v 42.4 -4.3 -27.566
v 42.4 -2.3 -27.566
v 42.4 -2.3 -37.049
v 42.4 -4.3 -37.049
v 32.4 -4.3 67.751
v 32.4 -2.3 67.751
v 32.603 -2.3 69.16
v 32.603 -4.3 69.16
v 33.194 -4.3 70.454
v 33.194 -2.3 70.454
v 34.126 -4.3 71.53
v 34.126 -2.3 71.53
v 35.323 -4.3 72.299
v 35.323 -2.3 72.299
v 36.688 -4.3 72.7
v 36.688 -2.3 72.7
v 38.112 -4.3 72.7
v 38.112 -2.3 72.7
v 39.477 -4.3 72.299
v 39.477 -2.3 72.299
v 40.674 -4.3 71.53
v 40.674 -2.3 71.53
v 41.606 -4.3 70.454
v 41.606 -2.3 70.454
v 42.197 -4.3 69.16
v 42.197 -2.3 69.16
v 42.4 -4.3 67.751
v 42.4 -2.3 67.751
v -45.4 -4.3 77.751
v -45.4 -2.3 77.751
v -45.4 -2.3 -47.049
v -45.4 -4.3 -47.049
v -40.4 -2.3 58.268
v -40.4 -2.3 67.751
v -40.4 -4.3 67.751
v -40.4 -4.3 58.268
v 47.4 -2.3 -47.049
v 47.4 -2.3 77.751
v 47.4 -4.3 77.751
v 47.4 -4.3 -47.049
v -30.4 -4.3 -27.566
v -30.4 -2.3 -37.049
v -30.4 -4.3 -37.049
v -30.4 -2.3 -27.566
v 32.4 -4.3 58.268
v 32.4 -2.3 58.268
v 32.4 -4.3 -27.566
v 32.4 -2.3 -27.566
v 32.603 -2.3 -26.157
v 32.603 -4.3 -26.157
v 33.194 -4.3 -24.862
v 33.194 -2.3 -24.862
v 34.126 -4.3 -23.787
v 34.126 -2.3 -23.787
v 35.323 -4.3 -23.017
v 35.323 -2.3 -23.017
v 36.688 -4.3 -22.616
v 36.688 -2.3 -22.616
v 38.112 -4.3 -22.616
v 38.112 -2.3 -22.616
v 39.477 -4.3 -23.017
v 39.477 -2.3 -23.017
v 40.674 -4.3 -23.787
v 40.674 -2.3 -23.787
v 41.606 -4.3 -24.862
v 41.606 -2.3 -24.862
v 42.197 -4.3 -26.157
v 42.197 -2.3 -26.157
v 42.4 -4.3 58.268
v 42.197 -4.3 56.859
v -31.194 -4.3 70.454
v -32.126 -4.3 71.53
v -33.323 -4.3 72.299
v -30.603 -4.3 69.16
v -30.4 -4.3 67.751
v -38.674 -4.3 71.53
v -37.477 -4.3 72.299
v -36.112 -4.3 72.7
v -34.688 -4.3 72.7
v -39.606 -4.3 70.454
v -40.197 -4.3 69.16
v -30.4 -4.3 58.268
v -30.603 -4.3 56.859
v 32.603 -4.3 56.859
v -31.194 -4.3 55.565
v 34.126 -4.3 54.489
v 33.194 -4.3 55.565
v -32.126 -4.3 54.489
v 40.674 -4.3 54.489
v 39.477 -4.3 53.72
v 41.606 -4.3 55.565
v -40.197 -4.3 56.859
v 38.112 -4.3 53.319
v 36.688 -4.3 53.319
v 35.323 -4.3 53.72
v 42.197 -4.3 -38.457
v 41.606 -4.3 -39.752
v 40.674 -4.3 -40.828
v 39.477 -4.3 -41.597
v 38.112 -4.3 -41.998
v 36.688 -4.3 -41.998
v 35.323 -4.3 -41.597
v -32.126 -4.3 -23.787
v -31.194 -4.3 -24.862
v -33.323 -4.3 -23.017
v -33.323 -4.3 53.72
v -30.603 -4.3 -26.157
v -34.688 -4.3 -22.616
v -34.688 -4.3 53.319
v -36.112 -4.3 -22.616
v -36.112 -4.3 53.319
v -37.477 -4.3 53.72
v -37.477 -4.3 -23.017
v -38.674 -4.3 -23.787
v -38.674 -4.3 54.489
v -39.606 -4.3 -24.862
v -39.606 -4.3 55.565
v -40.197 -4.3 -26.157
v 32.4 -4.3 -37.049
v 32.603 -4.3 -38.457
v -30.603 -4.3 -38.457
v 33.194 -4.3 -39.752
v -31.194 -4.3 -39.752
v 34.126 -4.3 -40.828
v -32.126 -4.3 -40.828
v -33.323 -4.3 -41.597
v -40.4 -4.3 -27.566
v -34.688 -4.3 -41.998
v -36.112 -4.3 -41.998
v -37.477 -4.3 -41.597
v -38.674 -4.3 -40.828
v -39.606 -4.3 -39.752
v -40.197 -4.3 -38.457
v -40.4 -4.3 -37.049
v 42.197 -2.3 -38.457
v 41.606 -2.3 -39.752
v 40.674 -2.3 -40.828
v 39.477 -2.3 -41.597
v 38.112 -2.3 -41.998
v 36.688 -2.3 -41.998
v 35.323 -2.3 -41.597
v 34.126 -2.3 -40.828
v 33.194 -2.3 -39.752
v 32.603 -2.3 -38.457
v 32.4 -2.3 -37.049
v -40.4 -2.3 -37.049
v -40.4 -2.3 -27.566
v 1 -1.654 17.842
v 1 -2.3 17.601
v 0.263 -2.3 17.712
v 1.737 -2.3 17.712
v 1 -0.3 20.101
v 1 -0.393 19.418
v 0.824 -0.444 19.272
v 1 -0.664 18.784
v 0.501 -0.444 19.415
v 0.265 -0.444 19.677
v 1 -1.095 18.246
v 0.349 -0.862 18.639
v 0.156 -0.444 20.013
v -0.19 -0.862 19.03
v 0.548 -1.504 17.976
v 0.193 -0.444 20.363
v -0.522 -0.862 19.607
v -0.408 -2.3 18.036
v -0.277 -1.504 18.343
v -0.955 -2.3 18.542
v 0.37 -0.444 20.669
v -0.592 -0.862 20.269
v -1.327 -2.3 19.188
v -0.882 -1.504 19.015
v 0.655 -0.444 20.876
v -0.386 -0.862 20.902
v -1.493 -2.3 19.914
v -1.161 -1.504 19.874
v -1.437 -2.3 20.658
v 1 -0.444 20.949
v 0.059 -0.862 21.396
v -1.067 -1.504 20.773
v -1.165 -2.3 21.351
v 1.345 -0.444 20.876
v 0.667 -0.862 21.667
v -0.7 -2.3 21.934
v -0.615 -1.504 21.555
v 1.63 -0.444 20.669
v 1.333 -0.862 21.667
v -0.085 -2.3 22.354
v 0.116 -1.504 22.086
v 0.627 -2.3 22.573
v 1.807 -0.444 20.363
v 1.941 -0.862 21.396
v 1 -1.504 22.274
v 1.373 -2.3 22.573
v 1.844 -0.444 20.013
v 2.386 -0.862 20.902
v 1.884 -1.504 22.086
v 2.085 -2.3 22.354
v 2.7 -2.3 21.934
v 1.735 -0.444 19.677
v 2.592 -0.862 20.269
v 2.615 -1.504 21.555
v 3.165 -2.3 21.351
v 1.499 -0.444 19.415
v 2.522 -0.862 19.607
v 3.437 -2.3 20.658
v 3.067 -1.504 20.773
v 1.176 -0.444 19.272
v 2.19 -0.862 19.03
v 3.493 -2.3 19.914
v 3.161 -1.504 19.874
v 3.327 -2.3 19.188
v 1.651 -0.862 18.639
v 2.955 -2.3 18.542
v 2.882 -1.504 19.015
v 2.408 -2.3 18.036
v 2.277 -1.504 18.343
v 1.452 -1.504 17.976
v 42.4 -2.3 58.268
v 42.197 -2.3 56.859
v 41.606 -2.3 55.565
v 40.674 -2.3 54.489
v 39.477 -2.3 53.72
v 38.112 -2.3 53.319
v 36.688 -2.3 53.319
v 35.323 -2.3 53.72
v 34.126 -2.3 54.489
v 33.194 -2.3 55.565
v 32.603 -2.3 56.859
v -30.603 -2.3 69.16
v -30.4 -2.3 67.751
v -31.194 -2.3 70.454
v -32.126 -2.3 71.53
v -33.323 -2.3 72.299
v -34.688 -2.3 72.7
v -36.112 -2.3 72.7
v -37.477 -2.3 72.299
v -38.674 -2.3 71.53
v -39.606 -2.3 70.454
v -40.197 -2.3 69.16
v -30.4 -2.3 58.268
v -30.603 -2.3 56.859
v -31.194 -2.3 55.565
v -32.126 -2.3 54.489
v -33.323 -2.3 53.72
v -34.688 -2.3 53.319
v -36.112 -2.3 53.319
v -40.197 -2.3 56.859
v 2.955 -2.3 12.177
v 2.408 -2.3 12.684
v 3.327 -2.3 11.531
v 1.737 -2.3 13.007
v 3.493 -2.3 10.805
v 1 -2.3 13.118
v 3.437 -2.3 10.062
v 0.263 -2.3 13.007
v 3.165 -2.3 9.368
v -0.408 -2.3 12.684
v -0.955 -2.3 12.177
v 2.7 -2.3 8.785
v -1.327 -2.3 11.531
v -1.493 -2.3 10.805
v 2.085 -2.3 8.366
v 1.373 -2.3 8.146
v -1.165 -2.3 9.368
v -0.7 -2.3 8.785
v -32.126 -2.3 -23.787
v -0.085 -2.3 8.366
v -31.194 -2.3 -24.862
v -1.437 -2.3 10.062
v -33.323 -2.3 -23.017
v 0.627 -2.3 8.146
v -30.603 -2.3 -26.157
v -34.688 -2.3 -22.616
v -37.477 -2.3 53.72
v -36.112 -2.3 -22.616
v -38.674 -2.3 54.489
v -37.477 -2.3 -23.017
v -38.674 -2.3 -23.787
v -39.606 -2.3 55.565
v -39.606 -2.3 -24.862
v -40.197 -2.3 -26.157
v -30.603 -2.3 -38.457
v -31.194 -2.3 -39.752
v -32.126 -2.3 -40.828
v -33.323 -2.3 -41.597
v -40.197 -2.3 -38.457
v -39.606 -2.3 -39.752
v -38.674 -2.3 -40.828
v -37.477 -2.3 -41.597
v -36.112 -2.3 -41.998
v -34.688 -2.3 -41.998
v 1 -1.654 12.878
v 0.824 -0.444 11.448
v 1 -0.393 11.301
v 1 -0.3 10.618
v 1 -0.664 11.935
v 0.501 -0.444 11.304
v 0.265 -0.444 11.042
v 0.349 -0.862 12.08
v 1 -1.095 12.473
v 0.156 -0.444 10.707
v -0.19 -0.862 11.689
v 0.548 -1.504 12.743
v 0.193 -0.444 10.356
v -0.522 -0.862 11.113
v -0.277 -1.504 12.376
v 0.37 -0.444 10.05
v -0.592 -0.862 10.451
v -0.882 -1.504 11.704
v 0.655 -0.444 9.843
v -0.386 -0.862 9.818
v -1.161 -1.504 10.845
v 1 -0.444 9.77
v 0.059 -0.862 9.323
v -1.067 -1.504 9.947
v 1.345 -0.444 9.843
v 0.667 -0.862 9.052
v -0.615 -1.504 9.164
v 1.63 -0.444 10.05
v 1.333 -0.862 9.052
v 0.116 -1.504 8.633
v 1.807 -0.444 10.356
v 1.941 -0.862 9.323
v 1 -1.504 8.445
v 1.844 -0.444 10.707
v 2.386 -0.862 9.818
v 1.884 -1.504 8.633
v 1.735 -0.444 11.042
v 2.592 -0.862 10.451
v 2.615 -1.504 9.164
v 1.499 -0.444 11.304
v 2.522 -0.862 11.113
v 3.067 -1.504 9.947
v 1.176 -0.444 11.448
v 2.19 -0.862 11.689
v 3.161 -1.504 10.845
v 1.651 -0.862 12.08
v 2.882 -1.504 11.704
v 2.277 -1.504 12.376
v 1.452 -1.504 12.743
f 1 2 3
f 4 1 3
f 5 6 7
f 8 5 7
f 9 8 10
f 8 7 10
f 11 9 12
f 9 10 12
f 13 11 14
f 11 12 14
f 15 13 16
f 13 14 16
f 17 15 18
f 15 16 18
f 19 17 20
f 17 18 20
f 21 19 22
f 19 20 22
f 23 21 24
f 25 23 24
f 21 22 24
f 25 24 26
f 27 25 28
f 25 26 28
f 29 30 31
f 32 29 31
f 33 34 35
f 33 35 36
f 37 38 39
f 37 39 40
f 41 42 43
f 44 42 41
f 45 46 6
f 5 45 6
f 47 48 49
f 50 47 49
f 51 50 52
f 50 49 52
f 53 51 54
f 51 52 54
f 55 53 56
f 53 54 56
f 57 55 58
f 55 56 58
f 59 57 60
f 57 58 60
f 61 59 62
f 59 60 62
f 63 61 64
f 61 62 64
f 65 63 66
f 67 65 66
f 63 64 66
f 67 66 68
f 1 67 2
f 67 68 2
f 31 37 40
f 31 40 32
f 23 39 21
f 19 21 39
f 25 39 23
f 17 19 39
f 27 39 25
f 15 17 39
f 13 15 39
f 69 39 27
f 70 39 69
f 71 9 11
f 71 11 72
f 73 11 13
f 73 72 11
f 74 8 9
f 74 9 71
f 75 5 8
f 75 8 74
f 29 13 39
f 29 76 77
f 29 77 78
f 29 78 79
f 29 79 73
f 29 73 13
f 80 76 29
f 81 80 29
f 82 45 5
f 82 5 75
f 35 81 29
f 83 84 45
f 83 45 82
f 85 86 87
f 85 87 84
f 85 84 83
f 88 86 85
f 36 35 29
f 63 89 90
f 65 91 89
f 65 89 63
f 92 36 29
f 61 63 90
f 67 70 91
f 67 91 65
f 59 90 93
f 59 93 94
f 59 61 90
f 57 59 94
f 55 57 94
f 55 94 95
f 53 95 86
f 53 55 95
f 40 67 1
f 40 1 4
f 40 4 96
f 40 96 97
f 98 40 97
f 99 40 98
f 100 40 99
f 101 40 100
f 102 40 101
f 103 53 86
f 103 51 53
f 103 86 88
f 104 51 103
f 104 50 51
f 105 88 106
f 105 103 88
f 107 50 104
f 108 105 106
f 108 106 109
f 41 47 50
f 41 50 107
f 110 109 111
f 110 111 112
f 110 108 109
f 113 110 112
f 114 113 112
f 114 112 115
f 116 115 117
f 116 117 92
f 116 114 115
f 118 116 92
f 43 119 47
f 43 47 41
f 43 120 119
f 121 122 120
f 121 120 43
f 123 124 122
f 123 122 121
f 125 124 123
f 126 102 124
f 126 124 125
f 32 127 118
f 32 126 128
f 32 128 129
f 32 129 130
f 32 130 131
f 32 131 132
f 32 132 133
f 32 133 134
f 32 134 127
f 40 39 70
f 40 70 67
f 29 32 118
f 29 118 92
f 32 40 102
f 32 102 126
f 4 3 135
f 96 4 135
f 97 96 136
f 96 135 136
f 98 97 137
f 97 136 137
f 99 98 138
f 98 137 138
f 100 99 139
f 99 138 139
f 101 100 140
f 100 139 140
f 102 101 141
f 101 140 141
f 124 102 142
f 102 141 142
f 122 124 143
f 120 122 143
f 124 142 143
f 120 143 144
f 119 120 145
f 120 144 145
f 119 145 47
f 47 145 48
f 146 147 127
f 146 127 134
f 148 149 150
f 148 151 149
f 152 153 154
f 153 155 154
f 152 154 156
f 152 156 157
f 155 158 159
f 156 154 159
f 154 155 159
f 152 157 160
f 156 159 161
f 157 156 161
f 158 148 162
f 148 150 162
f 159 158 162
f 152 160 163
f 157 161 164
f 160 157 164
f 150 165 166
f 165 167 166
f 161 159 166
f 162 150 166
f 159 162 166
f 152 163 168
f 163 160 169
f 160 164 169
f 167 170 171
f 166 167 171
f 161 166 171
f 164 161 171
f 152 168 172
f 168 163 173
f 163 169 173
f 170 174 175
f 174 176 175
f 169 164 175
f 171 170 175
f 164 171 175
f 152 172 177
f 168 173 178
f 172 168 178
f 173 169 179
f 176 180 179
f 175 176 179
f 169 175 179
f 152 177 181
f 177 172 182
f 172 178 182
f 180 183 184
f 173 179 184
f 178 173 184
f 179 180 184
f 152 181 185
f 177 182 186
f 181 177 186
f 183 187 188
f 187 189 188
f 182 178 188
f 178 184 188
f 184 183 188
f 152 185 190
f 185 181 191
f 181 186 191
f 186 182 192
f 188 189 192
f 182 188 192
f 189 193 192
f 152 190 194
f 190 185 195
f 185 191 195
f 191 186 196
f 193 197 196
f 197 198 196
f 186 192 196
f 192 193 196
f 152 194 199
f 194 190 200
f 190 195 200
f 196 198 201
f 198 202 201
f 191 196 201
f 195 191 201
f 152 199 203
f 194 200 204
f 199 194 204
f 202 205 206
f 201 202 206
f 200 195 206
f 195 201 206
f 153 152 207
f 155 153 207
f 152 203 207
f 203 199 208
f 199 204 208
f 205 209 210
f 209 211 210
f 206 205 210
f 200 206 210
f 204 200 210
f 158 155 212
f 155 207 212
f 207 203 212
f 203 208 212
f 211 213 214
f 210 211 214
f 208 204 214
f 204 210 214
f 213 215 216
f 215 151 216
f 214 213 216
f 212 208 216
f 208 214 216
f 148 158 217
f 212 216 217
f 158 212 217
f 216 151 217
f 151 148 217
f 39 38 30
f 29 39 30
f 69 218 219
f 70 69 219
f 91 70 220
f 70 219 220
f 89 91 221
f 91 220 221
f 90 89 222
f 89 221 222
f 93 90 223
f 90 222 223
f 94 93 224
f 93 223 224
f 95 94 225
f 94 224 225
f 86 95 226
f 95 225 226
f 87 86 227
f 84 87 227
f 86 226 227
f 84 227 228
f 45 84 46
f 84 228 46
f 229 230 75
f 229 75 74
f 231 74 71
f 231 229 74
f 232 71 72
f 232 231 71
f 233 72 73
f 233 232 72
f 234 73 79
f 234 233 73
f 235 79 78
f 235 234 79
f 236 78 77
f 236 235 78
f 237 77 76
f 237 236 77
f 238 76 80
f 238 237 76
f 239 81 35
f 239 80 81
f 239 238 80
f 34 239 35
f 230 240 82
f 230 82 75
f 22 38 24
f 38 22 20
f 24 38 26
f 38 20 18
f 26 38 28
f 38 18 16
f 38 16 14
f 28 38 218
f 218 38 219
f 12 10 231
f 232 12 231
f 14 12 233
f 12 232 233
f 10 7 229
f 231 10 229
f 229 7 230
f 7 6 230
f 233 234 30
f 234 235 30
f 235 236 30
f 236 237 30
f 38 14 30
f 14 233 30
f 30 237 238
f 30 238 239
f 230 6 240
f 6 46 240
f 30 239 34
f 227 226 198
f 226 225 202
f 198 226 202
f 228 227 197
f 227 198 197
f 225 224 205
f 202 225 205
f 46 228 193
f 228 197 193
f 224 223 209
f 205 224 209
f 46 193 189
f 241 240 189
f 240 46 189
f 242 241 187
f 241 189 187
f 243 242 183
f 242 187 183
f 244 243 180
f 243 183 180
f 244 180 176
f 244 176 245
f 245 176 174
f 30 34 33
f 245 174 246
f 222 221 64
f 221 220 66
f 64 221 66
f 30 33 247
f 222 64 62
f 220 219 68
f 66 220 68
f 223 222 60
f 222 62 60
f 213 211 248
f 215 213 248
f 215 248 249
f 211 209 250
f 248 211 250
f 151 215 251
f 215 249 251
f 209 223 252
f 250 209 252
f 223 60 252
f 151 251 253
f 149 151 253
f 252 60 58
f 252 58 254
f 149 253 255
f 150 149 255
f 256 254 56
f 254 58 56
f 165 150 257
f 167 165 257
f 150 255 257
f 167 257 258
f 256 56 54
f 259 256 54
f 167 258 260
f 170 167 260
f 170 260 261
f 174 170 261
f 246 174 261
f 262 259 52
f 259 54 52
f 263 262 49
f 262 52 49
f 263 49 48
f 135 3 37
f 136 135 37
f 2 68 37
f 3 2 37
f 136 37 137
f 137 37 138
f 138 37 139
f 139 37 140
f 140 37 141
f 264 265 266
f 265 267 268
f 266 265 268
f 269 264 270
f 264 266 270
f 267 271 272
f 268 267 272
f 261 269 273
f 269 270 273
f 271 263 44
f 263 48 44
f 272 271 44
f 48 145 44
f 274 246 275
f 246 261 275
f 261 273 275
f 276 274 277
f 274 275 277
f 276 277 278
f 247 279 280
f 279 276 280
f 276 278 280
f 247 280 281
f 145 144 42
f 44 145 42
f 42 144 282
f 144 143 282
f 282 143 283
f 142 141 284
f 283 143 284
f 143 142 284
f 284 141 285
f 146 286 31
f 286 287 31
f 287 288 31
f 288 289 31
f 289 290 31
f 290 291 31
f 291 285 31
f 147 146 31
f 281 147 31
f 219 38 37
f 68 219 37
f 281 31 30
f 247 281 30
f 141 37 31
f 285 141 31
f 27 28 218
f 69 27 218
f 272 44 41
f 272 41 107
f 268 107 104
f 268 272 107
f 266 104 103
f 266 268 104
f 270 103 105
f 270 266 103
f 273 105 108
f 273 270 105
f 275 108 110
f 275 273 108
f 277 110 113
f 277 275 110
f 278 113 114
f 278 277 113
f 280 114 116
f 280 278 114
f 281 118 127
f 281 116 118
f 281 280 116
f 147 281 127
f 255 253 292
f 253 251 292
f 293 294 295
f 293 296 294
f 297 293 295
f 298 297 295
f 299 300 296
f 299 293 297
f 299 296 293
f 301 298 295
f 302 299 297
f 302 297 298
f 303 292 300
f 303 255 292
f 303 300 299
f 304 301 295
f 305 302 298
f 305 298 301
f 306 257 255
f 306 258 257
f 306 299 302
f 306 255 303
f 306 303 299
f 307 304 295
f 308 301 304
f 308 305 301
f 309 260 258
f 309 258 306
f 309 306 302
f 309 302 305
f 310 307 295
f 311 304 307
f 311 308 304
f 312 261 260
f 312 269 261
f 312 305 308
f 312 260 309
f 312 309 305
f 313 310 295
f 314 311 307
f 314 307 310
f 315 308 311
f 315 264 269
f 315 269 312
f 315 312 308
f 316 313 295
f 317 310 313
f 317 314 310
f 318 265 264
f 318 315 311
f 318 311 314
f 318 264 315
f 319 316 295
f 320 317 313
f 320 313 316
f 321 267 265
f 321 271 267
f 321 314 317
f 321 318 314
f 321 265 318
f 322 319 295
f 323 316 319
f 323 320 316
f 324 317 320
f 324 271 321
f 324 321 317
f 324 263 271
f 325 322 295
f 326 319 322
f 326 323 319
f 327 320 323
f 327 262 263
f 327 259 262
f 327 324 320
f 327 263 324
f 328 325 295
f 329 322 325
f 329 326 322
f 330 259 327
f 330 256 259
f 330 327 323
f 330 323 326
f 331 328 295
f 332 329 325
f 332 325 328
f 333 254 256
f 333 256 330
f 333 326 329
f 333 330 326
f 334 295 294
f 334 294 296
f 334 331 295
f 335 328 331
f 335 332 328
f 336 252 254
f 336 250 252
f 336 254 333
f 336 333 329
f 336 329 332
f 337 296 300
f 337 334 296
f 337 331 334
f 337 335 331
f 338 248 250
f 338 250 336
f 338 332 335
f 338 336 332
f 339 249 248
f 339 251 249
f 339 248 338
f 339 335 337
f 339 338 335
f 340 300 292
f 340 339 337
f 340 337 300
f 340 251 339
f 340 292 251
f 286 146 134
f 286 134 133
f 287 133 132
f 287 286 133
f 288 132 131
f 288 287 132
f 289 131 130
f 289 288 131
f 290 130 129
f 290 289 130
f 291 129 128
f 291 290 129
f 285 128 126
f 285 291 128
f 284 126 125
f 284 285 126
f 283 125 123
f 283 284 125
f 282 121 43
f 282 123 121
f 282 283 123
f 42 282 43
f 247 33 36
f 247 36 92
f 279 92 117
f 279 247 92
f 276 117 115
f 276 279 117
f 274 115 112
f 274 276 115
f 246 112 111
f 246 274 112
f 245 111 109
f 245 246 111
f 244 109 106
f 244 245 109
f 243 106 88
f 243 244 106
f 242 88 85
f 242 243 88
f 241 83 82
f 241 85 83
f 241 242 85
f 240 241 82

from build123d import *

# Parameters (mm, degrees)
SKETCH1_W           = 92.8
SKETCH1_H           = 124.8
BOSS_EXTRUDE1_DEPTH = 2
CUT_EXTRUDE1_DEPTH  = 92.082431134


with BuildPart() as part:
    # Sketch1 → Boss-Extrude1 (new body)
    with BuildSketch(Plane(origin=(0, -2.3, 0), x_dir=(-1, 0, 0), z_dir=(0, -1, 0))):
        with Locations((-1, -15.351201027)):
            Rectangle(SKETCH1_W, SKETCH1_H)
    extrude(amount=BOSS_EXTRUDE1_DEPTH)

    # Sketch3 → Revolve2 (revolve)
    with BuildSketch(Plane.ZY.offset(-1), mode=Mode.PRIVATE) as revolve2_sk:
        with BuildLine():
            Line((8.11798754, -2.3), (10.61798754, -2.3))
            Line((10.61798754, -2.3), (10.61798754, -0.3))
            ThreePointArc((10.61798754, -0.3), (9.017206481, -0.861523676), (8.11798754, -2.3))
        make_face()
    revolve(revolve2_sk.sketch.rotate(Axis((1, -0.3, 10.61798754), (0, -1, 0)), 180), axis=Axis((1, -0.3, 10.61798754), (0, -1, 0)))

    # Sketch5 → Revolve3 (revolve)
    with BuildSketch(Plane.ZY.offset(-1)):
        with BuildLine():
            Line((20.10120103, -2.3), (20.10120103, -0.3))
            ThreePointArc((20.10120103, -0.3), (18.500419971, -0.861523676), (17.60120103, -2.3))
            Line((17.60120103, -2.3), (20.10120103, -2.3))
        make_face()
    revolve(axis=Axis((1, -2.3, 20.10120103), (0, 1, 0)))

    # Sketch6 → Cut-Extrude1 (cut, through all)
    with BuildSketch(Plane(origin=(0, -2.3, 0), x_dir=(1, 0, 0), z_dir=(0, 1, 0))):
        with BuildLine():
            Line((-30.4, 37.048798973), (-30.4, 27.565585483))
            ThreePointArc((-30.4, 27.565585483), (-35.4, 22.565585483), (-40.4, 27.565585483))
            Line((-40.4, 27.565585483), (-40.4, 37.048798973))
            ThreePointArc((-40.4, 37.048798973), (-35.4, 42.048798973), (-30.4, 37.048798973))
        make_face()
        with BuildLine():
            Line((-30.4, -58.267987537), (-30.4, -67.751201027))
            ThreePointArc((-30.4, -67.751201027), (-35.4, -72.751201027), (-40.4, -67.751201027))
            Line((-40.4, -67.751201027), (-40.4, -58.267987537))
            ThreePointArc((-40.4, -58.267987537), (-35.4, -53.267987537), (-30.4, -58.267987537))
        make_face()
    cut_extrude1 = extrude(amount=-CUT_EXTRUDE1_DEPTH, mode=Mode.SUBTRACT)

    # Mirror1: Cut-Extrude1 across plane
    add(cut_extrude1.mirror(Plane.ZY.offset(-1)), mode=Mode.SUBTRACT)


solid = part.part
